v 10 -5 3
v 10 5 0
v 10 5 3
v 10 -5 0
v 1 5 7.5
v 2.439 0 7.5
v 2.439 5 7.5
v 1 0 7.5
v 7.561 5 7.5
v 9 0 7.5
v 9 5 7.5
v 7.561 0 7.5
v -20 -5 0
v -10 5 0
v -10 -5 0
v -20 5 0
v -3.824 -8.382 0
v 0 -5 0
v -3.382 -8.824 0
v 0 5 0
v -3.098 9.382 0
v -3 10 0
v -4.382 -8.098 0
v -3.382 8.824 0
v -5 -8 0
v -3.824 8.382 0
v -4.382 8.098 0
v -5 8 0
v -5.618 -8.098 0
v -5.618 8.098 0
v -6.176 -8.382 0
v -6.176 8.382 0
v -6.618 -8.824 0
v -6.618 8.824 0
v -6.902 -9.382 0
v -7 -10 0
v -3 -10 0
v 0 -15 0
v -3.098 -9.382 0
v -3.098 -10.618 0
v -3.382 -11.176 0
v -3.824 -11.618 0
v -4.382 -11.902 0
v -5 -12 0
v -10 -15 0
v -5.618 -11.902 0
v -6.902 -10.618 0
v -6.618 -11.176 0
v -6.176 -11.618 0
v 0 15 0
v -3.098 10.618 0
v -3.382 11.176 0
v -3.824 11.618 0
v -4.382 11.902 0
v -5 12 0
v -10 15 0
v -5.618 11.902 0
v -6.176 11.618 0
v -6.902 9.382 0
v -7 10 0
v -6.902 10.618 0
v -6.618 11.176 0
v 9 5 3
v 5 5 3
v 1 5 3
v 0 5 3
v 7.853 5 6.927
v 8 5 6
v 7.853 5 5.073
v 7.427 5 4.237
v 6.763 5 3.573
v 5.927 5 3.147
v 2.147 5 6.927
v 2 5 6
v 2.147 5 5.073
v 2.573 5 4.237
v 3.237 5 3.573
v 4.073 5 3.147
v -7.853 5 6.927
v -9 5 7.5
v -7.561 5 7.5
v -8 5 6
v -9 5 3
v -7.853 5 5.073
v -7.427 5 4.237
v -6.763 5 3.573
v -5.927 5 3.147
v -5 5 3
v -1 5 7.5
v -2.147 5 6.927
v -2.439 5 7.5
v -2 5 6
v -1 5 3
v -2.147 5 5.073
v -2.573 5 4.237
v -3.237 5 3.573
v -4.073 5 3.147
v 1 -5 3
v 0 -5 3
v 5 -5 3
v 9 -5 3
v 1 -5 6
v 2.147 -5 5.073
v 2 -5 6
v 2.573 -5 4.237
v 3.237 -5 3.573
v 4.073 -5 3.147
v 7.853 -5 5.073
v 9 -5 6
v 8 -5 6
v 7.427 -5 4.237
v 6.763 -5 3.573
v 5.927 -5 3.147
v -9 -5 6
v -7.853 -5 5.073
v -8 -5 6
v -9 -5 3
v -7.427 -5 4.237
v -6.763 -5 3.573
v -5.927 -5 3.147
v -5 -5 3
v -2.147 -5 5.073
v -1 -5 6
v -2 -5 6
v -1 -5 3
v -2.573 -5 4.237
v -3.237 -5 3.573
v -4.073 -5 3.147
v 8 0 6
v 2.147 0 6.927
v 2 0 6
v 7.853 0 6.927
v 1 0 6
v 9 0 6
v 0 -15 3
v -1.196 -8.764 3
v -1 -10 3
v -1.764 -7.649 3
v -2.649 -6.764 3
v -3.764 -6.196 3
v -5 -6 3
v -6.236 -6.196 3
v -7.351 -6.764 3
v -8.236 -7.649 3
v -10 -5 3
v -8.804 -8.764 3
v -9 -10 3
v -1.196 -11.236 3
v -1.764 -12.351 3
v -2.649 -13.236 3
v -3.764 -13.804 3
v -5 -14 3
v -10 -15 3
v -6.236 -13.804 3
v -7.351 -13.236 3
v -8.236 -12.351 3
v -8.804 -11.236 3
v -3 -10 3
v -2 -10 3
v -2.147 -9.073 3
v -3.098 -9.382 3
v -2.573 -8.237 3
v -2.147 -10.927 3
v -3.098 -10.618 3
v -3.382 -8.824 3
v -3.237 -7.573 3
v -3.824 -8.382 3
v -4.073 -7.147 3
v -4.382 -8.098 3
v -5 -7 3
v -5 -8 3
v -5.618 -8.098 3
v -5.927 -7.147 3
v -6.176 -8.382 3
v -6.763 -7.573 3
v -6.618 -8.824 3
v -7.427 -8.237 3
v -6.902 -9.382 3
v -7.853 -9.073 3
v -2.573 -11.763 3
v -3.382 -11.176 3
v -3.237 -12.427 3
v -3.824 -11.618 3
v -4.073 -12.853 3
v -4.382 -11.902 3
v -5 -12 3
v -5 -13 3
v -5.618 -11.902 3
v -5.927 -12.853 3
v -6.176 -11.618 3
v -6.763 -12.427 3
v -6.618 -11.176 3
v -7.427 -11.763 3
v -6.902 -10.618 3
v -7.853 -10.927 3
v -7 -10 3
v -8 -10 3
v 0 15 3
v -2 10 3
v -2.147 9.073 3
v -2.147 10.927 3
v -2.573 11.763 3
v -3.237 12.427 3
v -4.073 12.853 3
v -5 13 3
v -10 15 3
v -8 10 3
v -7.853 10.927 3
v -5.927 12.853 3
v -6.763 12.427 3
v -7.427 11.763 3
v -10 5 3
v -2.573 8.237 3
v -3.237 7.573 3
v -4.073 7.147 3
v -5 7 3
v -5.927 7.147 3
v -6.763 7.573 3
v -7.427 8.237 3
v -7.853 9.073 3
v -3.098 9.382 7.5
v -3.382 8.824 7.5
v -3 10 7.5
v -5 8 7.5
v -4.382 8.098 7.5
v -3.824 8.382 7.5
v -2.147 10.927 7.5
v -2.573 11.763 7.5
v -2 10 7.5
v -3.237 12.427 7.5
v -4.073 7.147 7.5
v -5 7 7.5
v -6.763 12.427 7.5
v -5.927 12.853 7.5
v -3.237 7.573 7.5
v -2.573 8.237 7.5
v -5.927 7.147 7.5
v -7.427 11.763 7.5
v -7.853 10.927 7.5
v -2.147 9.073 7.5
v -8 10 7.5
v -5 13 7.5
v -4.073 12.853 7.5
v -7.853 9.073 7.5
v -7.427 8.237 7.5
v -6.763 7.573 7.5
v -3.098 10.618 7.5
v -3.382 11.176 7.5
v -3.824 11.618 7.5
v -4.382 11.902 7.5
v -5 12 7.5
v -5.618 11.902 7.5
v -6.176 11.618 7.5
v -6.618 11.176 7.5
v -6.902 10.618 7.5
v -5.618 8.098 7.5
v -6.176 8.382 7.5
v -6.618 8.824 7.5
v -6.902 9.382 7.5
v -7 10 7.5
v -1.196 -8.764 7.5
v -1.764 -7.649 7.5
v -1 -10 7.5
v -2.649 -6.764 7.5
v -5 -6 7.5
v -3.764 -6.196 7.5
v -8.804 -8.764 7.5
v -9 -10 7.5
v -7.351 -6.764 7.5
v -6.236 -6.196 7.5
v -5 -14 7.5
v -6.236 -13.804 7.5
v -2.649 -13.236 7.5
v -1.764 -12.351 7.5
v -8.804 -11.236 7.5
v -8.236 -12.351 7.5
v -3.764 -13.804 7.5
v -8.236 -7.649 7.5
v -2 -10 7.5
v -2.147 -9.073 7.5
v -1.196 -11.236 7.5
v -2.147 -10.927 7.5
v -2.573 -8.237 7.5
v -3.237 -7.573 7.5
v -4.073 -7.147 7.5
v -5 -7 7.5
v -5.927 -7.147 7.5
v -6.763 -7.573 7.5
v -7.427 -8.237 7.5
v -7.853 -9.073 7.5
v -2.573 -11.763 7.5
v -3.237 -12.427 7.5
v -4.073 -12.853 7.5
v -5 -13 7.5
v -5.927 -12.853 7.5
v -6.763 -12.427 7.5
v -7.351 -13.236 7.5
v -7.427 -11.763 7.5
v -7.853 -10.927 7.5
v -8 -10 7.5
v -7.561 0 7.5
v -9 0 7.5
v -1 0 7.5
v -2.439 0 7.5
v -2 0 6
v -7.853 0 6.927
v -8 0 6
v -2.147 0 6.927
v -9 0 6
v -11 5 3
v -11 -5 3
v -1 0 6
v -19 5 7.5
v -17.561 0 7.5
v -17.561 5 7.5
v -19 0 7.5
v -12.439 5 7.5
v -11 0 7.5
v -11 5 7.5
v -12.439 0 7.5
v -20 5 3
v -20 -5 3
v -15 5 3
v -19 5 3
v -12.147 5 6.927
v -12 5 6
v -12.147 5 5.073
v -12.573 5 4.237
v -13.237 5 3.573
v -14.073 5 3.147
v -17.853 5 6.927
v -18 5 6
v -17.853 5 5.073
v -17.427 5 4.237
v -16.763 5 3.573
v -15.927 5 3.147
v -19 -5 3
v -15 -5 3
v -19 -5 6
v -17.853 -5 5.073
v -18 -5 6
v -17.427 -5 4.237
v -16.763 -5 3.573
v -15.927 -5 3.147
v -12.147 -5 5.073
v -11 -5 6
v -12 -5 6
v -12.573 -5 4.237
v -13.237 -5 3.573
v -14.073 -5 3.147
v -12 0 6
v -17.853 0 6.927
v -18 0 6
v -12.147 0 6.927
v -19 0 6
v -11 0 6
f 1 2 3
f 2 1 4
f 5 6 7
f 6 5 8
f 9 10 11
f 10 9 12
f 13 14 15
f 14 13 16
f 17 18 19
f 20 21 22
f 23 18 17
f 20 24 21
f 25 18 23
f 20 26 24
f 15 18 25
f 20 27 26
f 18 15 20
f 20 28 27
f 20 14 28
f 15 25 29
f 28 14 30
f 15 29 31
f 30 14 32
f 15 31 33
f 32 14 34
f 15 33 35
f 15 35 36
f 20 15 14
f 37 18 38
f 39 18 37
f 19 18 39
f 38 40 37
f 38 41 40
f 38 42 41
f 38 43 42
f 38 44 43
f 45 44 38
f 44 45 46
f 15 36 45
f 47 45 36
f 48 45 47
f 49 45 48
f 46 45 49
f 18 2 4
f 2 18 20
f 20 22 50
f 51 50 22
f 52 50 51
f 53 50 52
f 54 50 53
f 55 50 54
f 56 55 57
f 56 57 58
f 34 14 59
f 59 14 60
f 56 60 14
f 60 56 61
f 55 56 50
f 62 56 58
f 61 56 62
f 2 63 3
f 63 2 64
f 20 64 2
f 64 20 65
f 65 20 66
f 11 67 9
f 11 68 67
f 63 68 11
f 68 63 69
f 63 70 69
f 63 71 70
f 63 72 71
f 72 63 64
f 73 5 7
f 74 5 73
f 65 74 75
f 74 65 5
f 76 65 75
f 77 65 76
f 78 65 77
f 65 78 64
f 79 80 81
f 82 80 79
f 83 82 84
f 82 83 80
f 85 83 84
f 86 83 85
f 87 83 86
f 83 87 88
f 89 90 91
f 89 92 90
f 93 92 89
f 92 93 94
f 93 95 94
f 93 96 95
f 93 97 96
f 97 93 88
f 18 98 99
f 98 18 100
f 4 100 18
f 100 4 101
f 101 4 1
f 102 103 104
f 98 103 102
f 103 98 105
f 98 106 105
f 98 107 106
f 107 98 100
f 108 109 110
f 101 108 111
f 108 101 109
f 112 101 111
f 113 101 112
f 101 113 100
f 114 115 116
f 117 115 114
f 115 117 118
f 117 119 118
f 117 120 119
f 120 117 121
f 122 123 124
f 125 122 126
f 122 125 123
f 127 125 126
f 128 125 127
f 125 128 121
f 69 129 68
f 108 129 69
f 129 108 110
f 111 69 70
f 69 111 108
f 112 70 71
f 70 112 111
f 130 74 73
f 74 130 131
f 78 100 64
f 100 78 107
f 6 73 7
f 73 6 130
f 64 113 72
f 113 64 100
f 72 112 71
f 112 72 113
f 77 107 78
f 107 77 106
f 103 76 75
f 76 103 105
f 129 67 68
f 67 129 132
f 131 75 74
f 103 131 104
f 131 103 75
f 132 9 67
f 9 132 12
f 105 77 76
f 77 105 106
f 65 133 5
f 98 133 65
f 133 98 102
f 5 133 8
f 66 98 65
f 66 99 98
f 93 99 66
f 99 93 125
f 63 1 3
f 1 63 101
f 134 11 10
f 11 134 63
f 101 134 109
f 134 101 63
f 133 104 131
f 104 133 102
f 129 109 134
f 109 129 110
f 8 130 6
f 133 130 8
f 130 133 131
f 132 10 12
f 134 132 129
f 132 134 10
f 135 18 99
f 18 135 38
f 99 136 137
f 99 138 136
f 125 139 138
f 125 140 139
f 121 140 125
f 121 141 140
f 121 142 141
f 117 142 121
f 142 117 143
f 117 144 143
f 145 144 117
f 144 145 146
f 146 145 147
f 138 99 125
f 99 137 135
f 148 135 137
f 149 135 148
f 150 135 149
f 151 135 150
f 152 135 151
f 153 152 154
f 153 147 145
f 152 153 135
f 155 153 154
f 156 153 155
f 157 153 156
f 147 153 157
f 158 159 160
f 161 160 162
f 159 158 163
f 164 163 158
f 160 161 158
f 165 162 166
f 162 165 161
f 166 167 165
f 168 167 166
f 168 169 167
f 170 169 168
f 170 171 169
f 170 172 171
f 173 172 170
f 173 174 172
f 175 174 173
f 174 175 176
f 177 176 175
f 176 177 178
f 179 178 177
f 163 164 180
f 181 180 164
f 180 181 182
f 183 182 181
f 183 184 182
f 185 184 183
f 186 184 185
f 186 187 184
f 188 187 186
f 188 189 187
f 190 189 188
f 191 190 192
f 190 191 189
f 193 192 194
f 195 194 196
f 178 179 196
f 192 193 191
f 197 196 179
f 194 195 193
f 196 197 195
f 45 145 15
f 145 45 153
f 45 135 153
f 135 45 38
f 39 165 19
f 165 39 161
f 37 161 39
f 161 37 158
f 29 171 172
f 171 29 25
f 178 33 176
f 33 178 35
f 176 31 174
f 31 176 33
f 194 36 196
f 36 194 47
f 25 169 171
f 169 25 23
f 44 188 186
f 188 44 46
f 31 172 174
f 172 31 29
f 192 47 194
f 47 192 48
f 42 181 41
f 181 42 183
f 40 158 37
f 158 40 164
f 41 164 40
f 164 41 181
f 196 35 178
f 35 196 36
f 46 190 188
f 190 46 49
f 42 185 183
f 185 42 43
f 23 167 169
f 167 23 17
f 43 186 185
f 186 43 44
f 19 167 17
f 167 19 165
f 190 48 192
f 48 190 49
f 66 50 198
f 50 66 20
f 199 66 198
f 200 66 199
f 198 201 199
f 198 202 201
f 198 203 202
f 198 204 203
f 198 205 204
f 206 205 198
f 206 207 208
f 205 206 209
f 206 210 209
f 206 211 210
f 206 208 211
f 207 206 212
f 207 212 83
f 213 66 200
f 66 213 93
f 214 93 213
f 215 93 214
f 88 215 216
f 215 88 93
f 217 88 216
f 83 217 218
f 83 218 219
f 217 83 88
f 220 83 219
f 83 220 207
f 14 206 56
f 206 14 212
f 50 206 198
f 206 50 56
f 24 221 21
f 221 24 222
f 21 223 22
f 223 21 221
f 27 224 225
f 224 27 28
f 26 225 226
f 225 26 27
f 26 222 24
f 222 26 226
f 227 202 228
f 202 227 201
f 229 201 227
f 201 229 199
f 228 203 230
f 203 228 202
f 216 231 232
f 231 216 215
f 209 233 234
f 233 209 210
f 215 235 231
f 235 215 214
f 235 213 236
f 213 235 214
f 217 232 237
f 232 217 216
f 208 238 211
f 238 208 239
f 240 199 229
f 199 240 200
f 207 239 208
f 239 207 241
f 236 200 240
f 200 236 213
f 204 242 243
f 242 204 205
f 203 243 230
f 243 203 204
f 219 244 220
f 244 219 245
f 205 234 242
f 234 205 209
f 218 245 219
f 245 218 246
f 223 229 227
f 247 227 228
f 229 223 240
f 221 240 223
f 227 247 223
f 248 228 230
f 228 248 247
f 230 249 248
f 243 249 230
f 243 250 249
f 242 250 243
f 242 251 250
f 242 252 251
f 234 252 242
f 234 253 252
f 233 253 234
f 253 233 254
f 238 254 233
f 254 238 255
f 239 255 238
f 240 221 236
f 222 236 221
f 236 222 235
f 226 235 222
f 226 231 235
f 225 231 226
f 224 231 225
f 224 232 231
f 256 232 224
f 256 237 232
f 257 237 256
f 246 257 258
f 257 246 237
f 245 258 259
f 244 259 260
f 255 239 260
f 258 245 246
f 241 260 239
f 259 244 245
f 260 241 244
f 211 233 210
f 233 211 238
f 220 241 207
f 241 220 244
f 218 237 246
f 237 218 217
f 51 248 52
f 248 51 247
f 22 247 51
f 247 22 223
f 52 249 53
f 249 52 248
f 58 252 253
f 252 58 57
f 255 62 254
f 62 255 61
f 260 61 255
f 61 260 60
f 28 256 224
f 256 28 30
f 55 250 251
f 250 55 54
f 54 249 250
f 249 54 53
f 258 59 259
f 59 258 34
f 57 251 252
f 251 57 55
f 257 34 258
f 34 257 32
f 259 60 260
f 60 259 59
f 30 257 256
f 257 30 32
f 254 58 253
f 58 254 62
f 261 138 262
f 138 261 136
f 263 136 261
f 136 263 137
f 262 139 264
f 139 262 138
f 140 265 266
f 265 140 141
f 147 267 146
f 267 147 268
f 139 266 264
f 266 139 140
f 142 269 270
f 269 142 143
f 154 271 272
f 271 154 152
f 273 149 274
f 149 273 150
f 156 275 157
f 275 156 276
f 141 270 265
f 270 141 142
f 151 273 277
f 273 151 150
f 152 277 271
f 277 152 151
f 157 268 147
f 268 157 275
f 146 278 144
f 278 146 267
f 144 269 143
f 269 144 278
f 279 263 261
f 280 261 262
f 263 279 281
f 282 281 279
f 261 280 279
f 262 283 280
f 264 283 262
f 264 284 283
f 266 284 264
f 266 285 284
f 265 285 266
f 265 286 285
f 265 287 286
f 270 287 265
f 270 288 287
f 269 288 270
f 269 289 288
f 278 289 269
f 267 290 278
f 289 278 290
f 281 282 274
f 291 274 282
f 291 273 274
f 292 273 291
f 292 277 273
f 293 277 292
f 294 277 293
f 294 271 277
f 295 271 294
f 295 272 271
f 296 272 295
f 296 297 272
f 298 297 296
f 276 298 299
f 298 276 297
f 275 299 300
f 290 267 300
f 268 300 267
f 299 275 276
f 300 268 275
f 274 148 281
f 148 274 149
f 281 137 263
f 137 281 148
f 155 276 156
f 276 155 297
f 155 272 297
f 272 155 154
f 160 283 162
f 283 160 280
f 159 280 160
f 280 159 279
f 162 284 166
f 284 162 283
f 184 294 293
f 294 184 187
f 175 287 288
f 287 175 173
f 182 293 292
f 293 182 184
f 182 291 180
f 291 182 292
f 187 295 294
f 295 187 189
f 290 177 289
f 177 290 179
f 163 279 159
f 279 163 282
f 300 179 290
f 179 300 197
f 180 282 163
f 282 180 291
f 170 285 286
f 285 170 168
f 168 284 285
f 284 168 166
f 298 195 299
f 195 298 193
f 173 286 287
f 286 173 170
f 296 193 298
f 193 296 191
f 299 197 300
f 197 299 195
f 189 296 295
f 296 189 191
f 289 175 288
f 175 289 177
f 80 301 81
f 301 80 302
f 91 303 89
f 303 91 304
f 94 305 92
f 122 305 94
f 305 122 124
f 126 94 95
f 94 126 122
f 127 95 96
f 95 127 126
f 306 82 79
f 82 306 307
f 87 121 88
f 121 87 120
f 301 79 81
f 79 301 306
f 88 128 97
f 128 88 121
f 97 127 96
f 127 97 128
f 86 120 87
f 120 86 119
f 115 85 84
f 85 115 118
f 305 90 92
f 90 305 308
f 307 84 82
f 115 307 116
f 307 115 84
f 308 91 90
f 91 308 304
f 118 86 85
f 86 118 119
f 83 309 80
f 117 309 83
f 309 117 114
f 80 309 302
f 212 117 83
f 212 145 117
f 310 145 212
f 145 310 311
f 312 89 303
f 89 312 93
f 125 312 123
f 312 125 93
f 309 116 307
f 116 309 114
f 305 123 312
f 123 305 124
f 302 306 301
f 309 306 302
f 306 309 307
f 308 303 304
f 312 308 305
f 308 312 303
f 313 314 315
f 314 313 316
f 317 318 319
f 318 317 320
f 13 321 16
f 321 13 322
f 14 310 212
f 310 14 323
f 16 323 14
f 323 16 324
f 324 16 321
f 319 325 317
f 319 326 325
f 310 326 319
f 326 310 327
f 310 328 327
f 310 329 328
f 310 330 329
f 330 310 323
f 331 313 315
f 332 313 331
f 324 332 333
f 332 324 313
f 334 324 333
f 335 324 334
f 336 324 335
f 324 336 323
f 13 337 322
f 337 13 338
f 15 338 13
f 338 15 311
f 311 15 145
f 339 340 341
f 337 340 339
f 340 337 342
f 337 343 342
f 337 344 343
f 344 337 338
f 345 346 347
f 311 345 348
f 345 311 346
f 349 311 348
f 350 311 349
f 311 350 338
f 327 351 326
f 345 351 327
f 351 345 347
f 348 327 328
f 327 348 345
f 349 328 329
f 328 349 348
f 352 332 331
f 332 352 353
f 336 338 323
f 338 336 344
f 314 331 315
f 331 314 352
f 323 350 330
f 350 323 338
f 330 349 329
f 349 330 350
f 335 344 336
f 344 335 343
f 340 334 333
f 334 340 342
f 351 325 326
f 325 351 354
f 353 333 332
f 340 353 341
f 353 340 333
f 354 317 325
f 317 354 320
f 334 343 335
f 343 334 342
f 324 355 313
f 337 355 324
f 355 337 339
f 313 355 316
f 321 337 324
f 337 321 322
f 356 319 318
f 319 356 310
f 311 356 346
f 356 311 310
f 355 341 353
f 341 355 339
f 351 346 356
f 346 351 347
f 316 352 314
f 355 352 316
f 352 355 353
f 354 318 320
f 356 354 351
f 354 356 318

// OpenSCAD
// file: mirror_copy.scad
module mirror_copy(vector=[1,0,0]){
    children();
    mirror(vector) children();
}
// main file
use <mirror_copy.scad>
dia=6;
n=3;
base=3;
width=dia+4;
depth=10;
height=dia/2+1.5*base;
hole=4;
for(i=[0:n-1]){
    translate([-i*width,-depth/2,0]) difference(){
        cube([width,depth,height]);
        translate([width/2,-1,dia/2+base]) rotate([-90,0,0]) cylinder(h=depth+2,d=dia,$fn=20);
        translate([0,0,base]) cube([1,depth,height-base]);
        translate([width-1,0,base]) cube([1,depth,height-base]);
        translate([0,0,dia/2+base]) cube([width,depth/2,dia/2]);
    }

        mirror_copy([0,1,0]) translate([-(n-1)*width/2,-depth*1.5,0]) difference(){  //mounting flange
        cube([width,depth,base]);
        translate([width/2,depth/2,0]) cylinder(h=base,d=hole,$fn=20);
        }
    //pillars
        translate([width/2-(n-1)*width/2,depth,0]) difference(){
        cylinder(h=height,d=hole+2,$fn=20);
        cylinder(h=height+2,d=hole,$fn=20);
        }
        translate([width/2-(n-1)*width/2,-depth,0]) difference(){
        cylinder(h=height,d=hole+4,$fn=20);
        cylinder(h=height+2,d=hole+2,$fn=20);
        }
}
    
